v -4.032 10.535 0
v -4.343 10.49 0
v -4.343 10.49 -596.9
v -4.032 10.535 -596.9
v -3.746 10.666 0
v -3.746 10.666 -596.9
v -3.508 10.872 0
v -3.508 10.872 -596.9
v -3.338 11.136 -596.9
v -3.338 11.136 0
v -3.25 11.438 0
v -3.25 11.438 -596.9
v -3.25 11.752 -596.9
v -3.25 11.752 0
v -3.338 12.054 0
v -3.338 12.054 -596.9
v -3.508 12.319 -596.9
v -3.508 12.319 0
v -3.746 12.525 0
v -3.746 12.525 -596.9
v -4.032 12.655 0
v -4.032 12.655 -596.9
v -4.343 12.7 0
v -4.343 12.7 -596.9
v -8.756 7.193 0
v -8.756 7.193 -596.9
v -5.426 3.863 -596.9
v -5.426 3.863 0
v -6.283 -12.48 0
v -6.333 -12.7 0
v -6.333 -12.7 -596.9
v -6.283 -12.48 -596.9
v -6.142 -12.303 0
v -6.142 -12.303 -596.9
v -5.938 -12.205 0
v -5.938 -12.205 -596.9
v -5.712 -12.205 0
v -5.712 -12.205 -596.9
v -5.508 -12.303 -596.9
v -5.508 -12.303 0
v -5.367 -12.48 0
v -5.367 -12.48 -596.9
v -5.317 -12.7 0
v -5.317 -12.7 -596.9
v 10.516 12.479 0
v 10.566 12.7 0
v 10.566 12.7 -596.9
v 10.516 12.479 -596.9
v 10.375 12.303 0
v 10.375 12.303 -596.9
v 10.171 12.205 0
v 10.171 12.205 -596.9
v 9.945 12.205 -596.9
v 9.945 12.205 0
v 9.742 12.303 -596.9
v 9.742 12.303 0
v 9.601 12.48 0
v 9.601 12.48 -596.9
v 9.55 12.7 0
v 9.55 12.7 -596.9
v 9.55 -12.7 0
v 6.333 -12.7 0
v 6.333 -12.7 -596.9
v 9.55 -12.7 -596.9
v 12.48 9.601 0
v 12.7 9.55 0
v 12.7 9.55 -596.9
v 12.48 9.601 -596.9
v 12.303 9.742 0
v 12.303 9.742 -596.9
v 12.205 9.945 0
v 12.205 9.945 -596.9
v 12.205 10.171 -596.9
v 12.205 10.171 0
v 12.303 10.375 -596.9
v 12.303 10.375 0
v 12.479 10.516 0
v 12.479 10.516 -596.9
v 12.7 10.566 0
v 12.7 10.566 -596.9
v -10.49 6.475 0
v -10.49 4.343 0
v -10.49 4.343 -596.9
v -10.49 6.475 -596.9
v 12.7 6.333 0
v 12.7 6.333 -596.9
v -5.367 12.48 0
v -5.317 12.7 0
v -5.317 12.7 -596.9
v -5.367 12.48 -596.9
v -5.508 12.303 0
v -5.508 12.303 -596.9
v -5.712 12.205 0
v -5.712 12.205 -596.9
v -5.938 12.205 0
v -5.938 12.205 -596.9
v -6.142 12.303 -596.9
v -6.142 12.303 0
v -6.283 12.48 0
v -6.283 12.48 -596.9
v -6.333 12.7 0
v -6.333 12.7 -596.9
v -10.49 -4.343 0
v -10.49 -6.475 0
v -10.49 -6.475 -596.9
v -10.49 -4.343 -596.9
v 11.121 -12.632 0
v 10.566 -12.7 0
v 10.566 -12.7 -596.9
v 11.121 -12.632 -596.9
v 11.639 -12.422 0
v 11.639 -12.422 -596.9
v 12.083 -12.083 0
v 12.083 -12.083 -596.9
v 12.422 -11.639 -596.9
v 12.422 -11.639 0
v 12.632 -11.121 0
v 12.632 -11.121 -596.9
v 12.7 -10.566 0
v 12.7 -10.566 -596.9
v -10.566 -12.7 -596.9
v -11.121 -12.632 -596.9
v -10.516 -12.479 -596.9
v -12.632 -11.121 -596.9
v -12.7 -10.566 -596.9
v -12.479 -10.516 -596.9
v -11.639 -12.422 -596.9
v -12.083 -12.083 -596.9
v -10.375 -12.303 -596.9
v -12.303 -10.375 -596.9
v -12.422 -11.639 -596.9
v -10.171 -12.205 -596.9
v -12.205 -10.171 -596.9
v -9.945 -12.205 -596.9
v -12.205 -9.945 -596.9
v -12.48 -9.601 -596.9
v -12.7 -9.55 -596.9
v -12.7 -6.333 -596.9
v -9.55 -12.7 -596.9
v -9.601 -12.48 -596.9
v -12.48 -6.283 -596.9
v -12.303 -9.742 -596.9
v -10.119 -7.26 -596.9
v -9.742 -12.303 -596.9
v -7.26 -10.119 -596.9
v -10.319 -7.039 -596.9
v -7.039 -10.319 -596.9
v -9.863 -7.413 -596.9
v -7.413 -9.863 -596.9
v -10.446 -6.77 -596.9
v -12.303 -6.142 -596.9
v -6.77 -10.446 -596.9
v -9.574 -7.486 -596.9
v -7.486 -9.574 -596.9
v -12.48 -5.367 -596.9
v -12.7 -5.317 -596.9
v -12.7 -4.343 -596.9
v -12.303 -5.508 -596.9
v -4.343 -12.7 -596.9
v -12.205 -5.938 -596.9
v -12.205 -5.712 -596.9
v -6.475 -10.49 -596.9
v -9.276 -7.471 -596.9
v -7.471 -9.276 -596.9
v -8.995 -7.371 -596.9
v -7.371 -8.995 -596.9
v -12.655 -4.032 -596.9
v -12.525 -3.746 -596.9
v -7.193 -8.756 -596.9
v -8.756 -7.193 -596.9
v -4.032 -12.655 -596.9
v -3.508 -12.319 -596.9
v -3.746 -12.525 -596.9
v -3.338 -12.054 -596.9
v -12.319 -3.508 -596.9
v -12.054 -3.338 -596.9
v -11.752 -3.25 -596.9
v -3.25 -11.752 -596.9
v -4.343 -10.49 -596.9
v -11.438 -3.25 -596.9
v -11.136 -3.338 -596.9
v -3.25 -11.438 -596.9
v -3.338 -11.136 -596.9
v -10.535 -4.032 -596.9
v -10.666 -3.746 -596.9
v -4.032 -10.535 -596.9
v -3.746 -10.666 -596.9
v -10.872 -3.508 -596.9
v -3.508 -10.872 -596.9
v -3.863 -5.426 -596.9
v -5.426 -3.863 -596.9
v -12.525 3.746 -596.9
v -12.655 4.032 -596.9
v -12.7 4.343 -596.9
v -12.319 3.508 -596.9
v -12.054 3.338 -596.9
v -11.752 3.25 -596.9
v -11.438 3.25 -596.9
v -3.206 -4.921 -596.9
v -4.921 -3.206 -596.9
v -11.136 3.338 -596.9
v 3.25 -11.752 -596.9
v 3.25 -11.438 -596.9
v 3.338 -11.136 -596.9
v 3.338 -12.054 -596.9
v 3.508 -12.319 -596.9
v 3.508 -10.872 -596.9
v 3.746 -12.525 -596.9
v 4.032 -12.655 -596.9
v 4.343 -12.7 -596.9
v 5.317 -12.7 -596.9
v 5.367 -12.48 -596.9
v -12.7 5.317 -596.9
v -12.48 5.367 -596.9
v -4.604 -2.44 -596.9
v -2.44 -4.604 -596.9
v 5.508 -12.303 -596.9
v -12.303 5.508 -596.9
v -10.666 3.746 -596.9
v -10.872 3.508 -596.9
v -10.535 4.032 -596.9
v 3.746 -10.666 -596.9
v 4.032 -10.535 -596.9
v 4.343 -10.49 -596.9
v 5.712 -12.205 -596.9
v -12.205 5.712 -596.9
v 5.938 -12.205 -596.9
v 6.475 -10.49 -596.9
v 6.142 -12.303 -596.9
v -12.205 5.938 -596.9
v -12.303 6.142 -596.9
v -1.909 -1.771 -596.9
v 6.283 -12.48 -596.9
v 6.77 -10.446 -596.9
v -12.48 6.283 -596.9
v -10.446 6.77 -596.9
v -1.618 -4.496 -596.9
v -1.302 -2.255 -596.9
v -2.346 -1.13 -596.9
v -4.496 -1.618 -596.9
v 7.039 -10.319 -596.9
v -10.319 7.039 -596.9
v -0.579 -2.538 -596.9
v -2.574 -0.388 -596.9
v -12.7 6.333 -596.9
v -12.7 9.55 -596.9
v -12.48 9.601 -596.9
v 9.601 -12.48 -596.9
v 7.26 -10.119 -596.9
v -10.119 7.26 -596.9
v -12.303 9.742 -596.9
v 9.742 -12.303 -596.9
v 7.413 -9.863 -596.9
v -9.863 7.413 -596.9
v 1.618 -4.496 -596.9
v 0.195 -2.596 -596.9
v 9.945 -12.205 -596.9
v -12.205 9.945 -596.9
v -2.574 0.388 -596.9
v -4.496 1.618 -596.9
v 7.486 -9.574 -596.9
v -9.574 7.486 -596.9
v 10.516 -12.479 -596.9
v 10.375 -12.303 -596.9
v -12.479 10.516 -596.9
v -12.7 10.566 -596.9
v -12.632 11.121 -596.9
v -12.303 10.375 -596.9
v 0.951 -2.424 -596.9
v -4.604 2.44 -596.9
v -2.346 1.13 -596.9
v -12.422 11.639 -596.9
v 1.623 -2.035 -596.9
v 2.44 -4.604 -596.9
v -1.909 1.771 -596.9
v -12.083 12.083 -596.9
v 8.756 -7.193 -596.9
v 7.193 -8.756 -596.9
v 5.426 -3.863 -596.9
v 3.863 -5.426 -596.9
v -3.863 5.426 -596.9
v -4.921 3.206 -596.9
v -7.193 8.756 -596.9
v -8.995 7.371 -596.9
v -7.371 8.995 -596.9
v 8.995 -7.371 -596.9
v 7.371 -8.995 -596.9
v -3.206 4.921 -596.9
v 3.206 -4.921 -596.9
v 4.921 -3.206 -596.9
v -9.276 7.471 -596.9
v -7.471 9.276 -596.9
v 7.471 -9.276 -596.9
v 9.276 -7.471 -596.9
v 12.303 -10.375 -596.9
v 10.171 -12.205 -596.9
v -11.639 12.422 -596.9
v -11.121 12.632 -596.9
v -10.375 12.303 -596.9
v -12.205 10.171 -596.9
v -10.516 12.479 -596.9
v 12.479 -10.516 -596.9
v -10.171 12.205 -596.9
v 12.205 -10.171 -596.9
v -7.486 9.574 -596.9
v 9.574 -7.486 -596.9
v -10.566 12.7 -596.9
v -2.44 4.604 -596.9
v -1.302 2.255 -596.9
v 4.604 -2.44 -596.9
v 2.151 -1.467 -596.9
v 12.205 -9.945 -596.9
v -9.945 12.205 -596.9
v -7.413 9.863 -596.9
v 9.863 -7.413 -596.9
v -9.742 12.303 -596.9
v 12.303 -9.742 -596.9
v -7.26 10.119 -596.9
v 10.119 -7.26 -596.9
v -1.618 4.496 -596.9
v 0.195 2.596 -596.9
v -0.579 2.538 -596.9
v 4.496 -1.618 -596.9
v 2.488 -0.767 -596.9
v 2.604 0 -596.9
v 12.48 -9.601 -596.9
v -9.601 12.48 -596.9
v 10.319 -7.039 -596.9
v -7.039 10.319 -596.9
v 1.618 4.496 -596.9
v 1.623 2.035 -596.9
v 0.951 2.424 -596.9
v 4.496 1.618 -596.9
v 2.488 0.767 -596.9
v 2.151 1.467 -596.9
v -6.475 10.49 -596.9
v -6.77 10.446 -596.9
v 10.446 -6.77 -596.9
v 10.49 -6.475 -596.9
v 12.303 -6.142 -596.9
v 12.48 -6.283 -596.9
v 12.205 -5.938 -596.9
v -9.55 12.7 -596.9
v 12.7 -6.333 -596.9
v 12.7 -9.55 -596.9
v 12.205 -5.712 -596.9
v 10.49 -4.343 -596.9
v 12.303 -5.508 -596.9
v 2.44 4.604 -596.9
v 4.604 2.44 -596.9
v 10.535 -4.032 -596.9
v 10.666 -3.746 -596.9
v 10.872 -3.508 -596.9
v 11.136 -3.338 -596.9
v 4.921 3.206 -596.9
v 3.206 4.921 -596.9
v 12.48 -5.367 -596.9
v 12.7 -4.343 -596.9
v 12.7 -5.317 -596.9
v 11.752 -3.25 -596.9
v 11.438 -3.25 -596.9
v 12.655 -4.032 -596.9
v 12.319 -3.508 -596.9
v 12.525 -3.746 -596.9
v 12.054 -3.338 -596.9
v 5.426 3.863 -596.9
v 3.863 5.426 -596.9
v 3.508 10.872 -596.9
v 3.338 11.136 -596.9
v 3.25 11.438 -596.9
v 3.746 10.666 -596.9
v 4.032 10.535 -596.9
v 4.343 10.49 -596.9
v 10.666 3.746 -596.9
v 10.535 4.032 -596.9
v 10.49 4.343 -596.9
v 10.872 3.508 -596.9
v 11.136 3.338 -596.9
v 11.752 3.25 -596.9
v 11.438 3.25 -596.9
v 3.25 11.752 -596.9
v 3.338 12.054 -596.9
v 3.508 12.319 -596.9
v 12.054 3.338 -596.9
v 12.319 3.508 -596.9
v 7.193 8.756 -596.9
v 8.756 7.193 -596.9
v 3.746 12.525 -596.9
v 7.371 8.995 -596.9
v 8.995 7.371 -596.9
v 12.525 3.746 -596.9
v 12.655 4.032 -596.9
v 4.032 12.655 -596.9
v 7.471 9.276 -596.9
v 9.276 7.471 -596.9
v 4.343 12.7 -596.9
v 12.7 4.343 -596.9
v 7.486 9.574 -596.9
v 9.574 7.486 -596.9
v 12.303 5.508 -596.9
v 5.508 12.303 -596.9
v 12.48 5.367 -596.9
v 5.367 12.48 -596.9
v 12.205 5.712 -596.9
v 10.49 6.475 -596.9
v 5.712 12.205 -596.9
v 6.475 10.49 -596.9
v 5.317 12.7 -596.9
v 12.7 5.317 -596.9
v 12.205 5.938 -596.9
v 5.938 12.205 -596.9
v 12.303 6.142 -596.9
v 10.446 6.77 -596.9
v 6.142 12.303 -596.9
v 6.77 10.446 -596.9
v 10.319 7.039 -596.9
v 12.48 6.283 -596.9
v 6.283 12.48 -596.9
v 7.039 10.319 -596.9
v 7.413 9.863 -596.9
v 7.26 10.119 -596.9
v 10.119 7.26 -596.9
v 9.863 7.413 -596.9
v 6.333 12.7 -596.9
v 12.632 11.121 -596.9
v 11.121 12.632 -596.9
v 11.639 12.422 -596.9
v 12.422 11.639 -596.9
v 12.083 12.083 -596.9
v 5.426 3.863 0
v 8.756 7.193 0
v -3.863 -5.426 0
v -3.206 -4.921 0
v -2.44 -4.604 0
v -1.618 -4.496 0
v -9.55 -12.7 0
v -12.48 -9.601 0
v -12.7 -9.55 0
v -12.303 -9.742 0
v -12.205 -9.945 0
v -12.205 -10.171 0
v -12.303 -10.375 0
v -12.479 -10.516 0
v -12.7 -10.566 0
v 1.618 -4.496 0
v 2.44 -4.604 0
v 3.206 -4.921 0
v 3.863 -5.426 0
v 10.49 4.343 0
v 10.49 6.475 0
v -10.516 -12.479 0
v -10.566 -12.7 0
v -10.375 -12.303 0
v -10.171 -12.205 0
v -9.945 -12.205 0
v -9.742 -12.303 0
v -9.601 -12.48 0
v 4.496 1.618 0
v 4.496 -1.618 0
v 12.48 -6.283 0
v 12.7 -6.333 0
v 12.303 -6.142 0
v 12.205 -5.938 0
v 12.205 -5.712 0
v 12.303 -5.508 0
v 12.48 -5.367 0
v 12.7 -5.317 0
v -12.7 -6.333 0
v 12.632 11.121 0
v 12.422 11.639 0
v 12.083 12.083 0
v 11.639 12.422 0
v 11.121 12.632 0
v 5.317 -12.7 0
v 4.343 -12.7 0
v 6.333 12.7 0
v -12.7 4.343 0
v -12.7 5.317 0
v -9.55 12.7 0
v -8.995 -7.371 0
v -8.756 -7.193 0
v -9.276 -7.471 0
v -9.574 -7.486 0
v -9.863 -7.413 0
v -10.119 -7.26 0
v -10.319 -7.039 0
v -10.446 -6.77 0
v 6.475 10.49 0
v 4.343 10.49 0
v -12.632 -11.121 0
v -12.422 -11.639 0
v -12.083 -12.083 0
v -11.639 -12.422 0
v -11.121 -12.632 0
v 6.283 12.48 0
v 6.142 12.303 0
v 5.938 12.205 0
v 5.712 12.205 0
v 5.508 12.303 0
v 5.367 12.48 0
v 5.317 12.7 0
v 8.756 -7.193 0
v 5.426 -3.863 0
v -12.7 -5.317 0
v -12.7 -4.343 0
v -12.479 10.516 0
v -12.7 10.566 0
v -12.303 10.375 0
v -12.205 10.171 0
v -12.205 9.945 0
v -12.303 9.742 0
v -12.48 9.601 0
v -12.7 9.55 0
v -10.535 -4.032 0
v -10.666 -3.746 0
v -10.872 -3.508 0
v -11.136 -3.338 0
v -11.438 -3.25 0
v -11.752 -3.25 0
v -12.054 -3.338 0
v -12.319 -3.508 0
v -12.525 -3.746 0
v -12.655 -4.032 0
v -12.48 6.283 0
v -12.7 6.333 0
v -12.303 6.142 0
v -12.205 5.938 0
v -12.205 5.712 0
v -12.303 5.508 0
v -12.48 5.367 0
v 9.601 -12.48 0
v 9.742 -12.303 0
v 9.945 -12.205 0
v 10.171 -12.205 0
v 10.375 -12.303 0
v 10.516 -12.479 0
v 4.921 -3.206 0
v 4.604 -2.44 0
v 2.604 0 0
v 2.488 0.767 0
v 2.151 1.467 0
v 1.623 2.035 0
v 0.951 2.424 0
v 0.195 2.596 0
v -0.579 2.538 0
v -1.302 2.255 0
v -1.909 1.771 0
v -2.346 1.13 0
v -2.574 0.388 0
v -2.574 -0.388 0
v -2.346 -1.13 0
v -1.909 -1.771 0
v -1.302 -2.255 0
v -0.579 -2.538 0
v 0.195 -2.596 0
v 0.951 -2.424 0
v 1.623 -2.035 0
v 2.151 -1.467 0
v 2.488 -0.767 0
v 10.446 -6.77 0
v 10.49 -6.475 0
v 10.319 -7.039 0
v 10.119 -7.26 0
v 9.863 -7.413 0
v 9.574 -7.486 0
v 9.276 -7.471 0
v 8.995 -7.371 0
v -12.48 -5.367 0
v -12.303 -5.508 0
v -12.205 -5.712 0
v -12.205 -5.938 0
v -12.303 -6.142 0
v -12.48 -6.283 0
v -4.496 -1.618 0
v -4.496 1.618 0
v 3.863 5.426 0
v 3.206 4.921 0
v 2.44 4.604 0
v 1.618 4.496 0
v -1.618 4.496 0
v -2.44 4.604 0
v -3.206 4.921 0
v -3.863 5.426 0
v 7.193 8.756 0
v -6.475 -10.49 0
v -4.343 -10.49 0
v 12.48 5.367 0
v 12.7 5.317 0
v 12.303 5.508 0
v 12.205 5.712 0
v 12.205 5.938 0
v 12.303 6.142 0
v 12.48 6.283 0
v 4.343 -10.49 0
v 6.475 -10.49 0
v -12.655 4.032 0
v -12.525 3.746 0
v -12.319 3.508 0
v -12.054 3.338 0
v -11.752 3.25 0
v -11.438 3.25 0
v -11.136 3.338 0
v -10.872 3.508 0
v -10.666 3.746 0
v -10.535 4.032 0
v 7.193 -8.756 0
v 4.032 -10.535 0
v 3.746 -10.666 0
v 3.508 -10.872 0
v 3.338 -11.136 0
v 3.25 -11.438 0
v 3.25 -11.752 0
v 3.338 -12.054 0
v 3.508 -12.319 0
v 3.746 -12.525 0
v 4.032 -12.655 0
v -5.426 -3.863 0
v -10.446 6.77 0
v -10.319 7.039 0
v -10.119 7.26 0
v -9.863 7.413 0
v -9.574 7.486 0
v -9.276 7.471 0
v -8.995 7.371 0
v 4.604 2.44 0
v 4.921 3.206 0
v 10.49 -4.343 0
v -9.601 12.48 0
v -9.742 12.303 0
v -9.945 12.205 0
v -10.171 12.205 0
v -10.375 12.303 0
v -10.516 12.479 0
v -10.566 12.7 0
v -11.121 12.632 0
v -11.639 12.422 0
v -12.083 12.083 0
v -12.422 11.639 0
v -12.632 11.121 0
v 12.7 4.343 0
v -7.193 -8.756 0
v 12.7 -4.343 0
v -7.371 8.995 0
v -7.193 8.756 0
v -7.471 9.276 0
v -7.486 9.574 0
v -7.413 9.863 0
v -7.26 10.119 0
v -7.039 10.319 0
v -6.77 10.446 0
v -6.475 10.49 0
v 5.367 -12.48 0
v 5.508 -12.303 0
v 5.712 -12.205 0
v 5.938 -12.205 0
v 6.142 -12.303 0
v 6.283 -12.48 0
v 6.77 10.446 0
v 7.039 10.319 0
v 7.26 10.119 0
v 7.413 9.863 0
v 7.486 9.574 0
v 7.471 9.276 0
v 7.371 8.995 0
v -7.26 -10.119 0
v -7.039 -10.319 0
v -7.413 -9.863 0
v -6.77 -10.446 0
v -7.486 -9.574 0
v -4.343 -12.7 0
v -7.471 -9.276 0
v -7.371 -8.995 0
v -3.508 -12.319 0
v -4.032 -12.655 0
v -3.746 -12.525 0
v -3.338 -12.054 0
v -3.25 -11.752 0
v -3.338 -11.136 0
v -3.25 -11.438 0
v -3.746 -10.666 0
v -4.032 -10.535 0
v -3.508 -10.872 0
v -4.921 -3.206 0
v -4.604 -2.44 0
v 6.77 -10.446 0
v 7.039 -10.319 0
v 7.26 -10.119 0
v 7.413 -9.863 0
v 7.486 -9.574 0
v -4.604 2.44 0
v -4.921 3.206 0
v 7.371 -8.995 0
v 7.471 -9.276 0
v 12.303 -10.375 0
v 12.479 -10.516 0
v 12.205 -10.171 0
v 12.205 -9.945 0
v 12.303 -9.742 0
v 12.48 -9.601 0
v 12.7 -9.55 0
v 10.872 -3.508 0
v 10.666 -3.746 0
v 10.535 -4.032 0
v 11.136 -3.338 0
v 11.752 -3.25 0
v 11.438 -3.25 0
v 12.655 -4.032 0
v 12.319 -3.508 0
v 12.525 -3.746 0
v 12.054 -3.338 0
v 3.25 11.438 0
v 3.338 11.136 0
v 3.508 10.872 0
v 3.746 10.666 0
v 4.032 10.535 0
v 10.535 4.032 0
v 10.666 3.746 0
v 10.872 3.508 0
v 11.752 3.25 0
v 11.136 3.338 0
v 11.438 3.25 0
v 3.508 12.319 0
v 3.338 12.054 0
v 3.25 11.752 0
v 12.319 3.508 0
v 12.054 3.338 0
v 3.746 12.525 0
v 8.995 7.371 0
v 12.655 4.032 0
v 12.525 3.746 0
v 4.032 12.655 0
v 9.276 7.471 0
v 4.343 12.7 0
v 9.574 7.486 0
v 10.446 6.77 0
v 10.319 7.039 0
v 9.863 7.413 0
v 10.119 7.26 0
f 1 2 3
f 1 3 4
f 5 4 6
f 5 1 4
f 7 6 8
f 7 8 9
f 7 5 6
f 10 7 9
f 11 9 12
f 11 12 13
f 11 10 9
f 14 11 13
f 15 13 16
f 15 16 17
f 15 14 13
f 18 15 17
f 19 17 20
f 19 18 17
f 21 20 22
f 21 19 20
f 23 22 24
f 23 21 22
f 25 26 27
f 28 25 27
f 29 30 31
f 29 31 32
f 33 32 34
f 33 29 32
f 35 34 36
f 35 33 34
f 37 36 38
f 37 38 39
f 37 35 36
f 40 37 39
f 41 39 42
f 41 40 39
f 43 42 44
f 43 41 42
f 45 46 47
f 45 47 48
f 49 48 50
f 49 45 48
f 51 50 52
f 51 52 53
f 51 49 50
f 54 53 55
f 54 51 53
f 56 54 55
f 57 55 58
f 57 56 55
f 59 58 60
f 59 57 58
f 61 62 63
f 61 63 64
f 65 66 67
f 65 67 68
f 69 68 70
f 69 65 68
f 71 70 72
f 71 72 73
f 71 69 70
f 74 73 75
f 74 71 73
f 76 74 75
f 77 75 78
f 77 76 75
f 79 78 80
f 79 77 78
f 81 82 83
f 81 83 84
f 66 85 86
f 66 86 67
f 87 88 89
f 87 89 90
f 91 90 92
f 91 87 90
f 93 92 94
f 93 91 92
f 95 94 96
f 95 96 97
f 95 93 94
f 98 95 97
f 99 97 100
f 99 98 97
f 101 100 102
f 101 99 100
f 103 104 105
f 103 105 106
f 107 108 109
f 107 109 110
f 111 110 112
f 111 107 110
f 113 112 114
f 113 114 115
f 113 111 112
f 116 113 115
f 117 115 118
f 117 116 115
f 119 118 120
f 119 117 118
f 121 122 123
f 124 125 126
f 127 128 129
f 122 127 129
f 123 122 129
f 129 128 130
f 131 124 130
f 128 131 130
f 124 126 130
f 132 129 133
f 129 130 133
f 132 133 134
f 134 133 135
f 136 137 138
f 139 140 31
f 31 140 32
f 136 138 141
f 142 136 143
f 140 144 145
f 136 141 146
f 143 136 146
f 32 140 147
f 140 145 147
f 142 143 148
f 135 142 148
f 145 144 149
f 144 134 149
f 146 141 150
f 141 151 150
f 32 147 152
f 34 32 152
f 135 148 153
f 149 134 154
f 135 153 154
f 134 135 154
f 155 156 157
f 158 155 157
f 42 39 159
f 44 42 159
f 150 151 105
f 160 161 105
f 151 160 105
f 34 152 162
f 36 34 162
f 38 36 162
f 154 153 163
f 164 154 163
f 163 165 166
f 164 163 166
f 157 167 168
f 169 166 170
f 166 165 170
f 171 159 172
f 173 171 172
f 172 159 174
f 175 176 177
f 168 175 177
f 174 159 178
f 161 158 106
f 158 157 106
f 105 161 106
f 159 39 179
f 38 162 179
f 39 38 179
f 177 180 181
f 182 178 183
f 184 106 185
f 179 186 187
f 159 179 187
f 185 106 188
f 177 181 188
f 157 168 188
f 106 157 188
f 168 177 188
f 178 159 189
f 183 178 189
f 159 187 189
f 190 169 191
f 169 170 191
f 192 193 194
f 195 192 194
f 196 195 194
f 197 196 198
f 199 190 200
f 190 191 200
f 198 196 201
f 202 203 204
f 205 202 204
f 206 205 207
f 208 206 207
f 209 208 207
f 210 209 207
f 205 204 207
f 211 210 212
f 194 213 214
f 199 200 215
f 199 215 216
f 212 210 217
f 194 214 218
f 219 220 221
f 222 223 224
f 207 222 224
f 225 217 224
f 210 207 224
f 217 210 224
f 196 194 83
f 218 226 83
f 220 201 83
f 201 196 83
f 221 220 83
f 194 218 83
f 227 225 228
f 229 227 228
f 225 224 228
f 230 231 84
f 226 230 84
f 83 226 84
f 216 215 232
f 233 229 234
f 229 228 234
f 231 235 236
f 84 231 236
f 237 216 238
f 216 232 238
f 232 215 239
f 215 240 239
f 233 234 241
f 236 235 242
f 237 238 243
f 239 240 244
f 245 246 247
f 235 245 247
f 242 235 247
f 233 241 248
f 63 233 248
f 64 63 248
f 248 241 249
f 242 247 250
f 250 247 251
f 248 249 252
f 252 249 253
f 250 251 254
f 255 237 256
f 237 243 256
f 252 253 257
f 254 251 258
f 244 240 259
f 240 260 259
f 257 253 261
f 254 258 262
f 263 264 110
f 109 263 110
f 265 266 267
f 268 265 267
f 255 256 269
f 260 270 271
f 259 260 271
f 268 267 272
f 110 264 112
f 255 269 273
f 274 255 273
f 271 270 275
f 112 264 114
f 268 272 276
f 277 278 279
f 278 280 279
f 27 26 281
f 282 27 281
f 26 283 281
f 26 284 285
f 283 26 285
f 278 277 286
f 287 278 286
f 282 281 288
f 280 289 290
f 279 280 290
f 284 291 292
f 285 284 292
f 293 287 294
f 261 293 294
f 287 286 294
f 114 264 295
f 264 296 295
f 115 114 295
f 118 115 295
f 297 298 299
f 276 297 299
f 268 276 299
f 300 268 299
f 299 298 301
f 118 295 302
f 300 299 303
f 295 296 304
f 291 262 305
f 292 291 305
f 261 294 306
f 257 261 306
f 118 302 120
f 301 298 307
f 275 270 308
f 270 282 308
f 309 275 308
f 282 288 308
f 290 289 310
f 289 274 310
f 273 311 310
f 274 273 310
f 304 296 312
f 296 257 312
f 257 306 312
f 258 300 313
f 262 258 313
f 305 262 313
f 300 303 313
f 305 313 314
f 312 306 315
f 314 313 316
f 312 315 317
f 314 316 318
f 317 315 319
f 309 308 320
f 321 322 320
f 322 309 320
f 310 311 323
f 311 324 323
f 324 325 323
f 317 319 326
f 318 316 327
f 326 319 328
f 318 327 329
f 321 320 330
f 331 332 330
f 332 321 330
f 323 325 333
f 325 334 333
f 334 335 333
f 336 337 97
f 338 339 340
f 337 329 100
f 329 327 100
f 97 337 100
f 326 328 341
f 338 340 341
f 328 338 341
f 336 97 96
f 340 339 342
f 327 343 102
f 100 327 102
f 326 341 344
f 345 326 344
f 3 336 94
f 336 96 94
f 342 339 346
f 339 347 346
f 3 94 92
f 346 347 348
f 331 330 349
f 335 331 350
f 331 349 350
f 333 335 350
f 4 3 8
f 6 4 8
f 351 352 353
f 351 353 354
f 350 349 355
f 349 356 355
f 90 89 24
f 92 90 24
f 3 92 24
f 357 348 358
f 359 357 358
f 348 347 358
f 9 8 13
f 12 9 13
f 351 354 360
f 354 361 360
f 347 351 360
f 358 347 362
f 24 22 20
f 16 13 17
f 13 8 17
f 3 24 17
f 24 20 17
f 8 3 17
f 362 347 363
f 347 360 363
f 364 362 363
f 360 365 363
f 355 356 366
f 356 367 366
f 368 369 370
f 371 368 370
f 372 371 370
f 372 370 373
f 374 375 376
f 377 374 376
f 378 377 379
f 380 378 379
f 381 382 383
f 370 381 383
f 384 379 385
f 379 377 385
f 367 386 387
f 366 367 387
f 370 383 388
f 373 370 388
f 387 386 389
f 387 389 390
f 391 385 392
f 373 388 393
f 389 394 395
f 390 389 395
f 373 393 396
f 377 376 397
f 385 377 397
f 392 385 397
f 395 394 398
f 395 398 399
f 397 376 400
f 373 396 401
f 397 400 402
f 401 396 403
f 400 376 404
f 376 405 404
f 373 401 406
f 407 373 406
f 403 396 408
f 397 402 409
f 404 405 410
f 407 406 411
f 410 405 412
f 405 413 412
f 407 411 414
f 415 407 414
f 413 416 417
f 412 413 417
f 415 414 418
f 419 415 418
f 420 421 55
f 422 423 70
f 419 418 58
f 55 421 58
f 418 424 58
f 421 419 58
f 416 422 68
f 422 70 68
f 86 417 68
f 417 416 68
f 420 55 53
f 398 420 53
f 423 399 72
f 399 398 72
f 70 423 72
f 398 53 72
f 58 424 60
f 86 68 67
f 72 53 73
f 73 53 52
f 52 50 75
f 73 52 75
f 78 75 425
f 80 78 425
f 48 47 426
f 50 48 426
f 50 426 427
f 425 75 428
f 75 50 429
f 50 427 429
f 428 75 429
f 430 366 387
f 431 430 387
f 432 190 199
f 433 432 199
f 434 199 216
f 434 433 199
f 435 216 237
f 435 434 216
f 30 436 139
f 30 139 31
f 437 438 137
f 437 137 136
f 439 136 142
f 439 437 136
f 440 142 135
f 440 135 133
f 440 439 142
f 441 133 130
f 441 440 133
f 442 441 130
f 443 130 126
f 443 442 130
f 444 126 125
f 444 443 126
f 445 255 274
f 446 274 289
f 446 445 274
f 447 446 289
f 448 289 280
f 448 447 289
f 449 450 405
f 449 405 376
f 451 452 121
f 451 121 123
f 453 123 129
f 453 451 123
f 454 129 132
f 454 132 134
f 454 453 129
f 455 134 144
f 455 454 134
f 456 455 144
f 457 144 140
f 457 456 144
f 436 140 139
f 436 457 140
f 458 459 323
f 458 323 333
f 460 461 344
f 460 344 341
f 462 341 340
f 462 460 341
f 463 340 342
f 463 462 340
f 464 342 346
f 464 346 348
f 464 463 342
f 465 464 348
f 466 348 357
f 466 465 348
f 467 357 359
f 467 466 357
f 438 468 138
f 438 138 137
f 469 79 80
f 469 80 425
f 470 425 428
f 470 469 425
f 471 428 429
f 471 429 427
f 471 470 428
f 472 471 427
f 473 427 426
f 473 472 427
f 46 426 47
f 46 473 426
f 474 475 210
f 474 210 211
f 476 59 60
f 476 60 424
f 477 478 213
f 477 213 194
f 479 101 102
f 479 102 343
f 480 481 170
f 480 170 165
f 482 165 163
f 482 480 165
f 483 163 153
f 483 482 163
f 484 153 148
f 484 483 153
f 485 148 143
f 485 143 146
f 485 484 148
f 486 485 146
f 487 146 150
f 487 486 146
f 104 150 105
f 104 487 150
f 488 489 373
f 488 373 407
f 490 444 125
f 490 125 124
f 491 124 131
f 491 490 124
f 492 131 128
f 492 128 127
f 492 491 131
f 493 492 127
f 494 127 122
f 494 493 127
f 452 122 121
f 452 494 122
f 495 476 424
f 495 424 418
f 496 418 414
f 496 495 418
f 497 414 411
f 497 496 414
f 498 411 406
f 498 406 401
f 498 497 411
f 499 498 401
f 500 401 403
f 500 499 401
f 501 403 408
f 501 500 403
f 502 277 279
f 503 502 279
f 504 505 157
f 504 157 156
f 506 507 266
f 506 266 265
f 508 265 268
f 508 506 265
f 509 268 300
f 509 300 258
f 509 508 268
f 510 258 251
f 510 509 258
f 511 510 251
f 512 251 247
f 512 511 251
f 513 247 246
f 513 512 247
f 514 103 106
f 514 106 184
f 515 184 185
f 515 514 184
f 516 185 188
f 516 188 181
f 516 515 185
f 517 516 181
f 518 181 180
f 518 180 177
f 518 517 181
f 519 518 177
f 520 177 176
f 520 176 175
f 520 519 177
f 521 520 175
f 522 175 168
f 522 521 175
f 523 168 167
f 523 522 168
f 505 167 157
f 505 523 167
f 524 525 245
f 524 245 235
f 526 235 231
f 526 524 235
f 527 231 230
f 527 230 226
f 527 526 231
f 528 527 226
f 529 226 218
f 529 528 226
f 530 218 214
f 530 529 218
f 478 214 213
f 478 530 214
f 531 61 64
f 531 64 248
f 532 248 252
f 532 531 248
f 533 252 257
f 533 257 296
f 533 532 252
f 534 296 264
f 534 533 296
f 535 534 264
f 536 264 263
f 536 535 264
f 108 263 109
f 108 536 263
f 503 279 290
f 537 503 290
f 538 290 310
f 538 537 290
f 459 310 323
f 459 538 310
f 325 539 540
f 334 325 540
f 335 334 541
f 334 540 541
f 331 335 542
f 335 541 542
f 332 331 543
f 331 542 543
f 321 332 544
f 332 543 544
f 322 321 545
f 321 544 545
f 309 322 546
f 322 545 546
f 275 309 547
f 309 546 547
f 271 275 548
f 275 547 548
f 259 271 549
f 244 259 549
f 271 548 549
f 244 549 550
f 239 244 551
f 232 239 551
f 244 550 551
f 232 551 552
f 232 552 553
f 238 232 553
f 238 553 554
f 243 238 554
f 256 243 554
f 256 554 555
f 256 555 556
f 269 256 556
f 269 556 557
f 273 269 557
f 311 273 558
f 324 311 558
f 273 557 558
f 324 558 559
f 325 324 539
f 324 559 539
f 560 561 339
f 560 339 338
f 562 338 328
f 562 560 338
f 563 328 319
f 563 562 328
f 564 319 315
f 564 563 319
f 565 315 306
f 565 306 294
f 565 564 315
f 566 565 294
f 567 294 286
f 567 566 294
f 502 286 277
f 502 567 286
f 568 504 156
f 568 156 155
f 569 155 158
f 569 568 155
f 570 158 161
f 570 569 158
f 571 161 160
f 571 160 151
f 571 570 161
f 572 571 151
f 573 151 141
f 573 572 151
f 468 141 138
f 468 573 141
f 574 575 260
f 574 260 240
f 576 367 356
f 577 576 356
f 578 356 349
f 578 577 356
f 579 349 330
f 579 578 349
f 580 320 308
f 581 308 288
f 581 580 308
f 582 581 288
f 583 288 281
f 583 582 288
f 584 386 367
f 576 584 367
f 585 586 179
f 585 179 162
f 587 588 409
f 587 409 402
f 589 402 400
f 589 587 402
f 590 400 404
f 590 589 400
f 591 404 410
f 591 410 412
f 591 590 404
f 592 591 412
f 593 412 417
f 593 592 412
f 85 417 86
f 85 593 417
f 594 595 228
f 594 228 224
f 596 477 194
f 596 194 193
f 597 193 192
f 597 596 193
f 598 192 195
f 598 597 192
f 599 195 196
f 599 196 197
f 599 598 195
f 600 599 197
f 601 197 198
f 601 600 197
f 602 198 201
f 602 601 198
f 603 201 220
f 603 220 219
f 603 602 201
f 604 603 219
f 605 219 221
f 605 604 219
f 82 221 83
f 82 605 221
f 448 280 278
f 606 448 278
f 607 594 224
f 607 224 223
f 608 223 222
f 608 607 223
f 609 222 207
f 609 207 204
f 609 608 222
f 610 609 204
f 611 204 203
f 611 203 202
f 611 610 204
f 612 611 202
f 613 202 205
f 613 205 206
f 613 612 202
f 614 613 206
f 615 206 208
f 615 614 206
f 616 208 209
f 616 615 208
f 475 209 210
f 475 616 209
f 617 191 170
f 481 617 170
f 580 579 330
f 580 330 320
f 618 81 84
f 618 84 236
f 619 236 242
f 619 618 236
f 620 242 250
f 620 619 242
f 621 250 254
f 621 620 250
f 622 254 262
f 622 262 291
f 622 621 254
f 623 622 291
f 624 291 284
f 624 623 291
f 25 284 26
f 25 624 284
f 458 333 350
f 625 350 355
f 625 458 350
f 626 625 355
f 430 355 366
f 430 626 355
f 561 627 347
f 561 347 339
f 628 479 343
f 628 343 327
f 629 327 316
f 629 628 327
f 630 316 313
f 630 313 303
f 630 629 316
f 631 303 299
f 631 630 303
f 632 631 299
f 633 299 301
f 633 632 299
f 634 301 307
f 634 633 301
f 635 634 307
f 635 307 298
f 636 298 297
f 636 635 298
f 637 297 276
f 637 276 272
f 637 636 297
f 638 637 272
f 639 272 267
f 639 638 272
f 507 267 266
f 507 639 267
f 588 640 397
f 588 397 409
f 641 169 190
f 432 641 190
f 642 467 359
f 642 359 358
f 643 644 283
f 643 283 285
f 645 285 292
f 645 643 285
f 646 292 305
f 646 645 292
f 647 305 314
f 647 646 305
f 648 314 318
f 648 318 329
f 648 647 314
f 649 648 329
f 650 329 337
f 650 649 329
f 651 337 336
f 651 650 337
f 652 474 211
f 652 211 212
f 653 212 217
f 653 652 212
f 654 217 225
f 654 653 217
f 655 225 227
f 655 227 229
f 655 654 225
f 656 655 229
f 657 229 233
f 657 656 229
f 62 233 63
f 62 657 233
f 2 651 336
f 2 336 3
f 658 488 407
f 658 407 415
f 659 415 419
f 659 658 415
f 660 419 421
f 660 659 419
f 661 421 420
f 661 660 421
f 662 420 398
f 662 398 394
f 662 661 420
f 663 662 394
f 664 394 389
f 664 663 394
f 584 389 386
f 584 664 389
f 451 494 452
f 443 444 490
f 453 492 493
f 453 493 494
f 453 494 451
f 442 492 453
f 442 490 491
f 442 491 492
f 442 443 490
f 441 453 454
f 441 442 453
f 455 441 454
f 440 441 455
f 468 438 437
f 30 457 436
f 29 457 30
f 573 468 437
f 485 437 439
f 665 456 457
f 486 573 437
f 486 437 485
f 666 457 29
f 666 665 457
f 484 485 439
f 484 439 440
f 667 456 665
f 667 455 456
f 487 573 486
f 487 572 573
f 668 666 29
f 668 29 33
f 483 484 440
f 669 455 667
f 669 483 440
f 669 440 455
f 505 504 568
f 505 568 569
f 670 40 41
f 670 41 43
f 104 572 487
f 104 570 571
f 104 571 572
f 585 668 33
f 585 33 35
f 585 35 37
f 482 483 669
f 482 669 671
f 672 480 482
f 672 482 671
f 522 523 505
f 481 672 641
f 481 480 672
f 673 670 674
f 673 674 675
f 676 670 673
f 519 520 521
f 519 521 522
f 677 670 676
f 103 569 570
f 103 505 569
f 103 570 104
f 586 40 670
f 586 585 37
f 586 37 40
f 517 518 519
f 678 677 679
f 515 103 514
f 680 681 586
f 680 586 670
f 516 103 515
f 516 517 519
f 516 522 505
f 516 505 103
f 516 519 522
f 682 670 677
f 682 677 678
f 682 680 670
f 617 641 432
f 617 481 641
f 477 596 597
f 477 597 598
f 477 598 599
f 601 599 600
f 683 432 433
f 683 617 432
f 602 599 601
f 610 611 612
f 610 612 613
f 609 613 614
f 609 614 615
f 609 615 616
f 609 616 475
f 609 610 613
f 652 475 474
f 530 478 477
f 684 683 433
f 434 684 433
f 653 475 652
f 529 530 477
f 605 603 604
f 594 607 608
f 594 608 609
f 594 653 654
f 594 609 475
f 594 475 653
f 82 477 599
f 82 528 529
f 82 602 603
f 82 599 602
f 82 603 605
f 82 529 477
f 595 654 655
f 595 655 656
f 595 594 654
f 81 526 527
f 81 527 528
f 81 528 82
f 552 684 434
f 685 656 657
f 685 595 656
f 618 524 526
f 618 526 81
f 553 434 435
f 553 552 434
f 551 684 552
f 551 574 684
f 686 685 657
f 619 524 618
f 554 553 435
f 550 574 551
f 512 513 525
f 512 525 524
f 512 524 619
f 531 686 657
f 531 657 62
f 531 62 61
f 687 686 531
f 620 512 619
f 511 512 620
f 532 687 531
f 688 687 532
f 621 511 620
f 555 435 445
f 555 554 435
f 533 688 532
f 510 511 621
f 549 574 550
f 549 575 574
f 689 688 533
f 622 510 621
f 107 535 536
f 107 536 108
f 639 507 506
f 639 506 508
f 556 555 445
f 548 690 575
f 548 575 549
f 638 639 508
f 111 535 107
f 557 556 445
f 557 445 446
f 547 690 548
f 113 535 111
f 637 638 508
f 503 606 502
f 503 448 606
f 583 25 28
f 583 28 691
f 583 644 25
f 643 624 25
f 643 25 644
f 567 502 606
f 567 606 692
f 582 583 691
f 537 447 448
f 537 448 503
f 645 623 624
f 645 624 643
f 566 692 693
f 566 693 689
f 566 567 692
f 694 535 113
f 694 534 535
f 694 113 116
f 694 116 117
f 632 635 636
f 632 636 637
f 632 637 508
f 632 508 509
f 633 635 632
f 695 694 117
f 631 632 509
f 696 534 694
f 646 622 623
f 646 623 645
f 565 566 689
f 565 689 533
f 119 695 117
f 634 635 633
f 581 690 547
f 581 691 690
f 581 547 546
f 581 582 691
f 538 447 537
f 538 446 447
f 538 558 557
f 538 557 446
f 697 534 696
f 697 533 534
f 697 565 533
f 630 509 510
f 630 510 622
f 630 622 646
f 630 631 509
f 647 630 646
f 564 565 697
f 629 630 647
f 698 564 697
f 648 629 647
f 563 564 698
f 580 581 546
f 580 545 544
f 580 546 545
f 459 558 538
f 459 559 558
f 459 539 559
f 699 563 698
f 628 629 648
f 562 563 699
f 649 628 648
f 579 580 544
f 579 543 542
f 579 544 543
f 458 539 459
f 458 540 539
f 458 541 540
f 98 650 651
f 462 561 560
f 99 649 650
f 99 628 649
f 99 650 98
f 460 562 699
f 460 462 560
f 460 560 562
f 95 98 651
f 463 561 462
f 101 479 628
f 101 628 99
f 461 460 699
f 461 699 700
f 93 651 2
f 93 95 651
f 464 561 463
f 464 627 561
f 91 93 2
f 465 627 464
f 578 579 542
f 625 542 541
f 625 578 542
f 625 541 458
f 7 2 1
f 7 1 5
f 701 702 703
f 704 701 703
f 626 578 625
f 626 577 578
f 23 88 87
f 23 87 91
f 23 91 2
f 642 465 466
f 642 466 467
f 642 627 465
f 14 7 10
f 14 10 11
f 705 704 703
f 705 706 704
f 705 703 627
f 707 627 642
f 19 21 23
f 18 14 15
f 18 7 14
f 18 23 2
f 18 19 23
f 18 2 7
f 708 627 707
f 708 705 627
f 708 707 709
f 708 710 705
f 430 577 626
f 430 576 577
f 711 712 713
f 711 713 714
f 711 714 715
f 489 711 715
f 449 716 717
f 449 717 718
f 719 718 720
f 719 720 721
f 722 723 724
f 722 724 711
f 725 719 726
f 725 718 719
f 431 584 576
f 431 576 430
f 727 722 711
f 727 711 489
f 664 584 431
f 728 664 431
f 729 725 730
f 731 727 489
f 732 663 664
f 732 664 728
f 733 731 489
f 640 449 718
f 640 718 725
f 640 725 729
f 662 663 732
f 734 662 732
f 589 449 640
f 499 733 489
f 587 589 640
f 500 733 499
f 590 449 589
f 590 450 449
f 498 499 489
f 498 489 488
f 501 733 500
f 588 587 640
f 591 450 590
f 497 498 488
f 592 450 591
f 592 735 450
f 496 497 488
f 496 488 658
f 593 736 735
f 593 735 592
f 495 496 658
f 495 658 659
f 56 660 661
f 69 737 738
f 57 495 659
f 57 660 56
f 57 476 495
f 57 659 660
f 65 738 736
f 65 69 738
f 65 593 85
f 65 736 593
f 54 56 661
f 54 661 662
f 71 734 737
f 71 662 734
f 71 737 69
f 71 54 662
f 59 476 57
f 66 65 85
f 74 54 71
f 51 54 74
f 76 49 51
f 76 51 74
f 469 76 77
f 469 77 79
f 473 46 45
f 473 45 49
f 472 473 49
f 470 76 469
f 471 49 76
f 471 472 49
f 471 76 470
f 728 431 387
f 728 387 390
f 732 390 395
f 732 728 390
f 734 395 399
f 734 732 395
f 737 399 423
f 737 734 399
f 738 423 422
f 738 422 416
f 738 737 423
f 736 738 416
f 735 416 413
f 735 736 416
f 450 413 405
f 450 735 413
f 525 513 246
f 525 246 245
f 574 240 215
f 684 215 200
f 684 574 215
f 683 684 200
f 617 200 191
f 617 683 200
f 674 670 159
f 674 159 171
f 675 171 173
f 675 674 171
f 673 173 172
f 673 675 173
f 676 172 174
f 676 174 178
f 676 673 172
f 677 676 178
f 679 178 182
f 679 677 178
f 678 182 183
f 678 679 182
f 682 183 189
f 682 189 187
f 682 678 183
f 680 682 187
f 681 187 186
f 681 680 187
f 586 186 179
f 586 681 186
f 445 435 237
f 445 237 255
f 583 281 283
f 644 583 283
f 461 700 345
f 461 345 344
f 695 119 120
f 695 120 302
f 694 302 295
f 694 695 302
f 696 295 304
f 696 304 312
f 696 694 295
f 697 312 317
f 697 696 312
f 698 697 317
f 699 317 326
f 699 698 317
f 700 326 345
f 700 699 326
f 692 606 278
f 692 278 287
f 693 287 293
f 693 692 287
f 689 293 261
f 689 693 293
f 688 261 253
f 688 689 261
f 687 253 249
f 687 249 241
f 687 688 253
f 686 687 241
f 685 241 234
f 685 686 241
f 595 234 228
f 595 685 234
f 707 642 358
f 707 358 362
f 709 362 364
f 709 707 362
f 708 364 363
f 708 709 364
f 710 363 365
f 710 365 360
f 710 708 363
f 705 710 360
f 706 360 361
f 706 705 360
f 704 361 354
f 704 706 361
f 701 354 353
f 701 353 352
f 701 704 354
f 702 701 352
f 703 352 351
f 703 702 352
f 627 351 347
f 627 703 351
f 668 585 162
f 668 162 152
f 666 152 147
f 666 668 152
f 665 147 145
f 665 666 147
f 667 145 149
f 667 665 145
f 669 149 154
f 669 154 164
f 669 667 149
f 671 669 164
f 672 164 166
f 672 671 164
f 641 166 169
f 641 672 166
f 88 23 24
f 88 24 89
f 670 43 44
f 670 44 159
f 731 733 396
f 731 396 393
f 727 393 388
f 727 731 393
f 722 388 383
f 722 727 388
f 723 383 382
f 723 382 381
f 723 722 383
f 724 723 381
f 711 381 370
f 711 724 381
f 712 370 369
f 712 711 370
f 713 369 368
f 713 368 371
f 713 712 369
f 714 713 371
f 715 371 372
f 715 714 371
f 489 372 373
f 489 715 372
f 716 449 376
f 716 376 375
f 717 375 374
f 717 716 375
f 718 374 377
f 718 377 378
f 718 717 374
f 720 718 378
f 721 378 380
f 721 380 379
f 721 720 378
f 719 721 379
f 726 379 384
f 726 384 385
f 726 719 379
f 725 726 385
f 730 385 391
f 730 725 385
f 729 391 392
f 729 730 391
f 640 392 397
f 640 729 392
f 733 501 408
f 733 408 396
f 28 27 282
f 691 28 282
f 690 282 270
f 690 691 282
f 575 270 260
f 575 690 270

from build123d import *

# Parameters (mm, degrees)
SKETCH1_R           = 2.6035
BOSS_EXTRUDE1_DEPTH = 596.9


with BuildPart() as part:
    # Sketch1 → Boss-Extrude1 (new body)
    with BuildSketch(Plane.XY):
        with BuildLine():
            Line((-12.7, 9.5504), (-12.7, 6.3330836))
            ThreePointArc((-12.7, 6.3330836), (-12.191999975, 5.8250836), (-12.7, 5.3170836))
            Line((-12.7, 5.3170836), (-12.7, 4.3434))
            ThreePointArc((-12.7, 4.3434), (-11.5951, 3.238499971), (-10.4902, 4.3434))
            Line((-10.4902, 4.3434), (-10.4902, 6.474794456))
            ThreePointArc((-10.4902, 6.474794456), (-9.863006367, 7.413456061), (-8.75577951, 7.193214945))
            Line((-8.75577951, 7.193214945), (-5.42573597, 3.863171405))
            ThreePointArc((-5.42573597, 3.863171405), (-4.737482484, 2.833127272), (-4.4958, 1.618107374))
            Line((-4.4958, 1.618107374), (-4.4958, -1.618107374))
            ThreePointArc((-4.4958, -1.618107374), (-4.737482484, -2.833127272), (-5.42573597, -3.863171405))
            Line((-5.42573597, -3.863171405), (-8.75577951, -7.193214945))
            ThreePointArc((-8.75577951, -7.193214945), (-9.863006367, -7.413456061), (-10.4902, -6.474794456))
            Line((-10.4902, -6.474794456), (-10.4902, -4.3434))
            ThreePointArc((-10.4902, -4.3434), (-11.5951, -3.2385), (-12.7, -4.3434))
            Line((-12.7, -4.3434), (-12.7, -5.3170836))
            ThreePointArc((-12.7, -5.3170836), (-12.191999983, -5.8250836), (-12.7, -6.3330836))
            Line((-12.7, -6.3330836), (-12.7, -9.5504))
            ThreePointArc((-12.7, -9.5504), (-12.192000006, -10.058323491), (-12.699846982, -10.566399977))
            ThreePointArc((-12.699846982, -10.566399977), (-12.082522516, -12.082522516), (-10.566399977, -12.699846982))
            ThreePointArc((-10.566399977, -12.699846982), (-10.058323491, -12.192000006), (-9.5504, -12.7))
            Line((-9.5504, -12.7), (-6.3330836, -12.7))
            ThreePointArc((-6.3330836, -12.7), (-5.8250836, -12.191999983), (-5.3170836, -12.7))
            Line((-5.3170836, -12.7), (-4.3434, -12.7))
            ThreePointArc((-4.3434, -12.7), (-3.238499971, -11.5951), (-4.3434, -10.4902))
            Line((-4.3434, -10.4902), (-6.474794456, -10.4902))
            ThreePointArc((-6.474794456, -10.4902), (-7.413456061, -9.863006367), (-7.193214945, -8.75577951))
            Line((-7.193214945, -8.75577951), (-3.863171405, -5.42573597))
            ThreePointArc((-3.863171405, -5.42573597), (-2.833127272, -4.737482484), (-1.618107374, -4.4958))
            Line((-1.618107374, -4.4958), (1.618107374, -4.4958))
            ThreePointArc((1.618107374, -4.4958), (2.833127272, -4.737482484), (3.863171405, -5.42573597))
            Line((3.863171405, -5.42573597), (7.193214945, -8.75577951))
            ThreePointArc((7.193214945, -8.75577951), (7.413456061, -9.863006367), (6.474794456, -10.4902))
            Line((6.474794456, -10.4902), (4.3434, -10.4902))
            ThreePointArc((4.3434, -10.4902), (3.2385, -11.5951), (4.3434, -12.7))
            Line((4.3434, -12.7), (5.3170836, -12.7))
            ThreePointArc((5.3170836, -12.7), (5.8250836, -12.191999983), (6.3330836, -12.7))
            Line((6.3330836, -12.7), (9.5504, -12.7))
            ThreePointArc((9.5504, -12.7), (10.058323491, -12.192000006), (10.566399977, -12.699846982))
            ThreePointArc((10.566399977, -12.699846982), (12.082522516, -12.082522516), (12.699846982, -10.566399977))
            ThreePointArc((12.699846982, -10.566399977), (12.192000006, -10.058323491), (12.7, -9.5504))
            Line((12.7, -9.5504), (12.7, -6.3330836))
            ThreePointArc((12.7, -6.3330836), (12.191999983, -5.8250836), (12.7, -5.3170836))
            Line((12.7, -5.3170836), (12.7, -4.3434))
            ThreePointArc((12.7, -4.3434), (11.5951, -3.238499971), (10.4902, -4.3434))
            Line((10.4902, -4.3434), (10.4902, -6.474794456))
            ThreePointArc((10.4902, -6.474794456), (9.863006367, -7.413456061), (8.75577951, -7.193214945))
            Line((8.75577951, -7.193214945), (5.42573597, -3.863171405))
            ThreePointArc((5.42573597, -3.863171405), (4.737482484, -2.833127272), (4.4958, -1.618107374))
            Line((4.4958, -1.618107374), (4.4958, 1.618107374))
            ThreePointArc((4.4958, 1.618107374), (4.737482484, 2.833127272), (5.42573597, 3.863171405))
            Line((5.42573597, 3.863171405), (8.75577951, 7.193214945))
            ThreePointArc((8.75577951, 7.193214945), (9.863006367, 7.413456061), (10.4902, 6.474794456))
            Line((10.4902, 6.474794456), (10.4902, 4.3434))
            ThreePointArc((10.4902, 4.3434), (11.5951, 3.2385), (12.7, 4.3434))
            Line((12.7, 4.3434), (12.7, 5.3170836))
            ThreePointArc((12.7, 5.3170836), (12.191999983, 5.8250836), (12.7, 6.3330836))
            Line((12.7, 6.3330836), (12.7, 9.5504))
            ThreePointArc((12.7, 9.5504), (12.192000006, 10.058323491), (12.699846982, 10.566399977))
            ThreePointArc((12.699846982, 10.566399977), (12.082522516, 12.082522516), (10.566399977, 12.699846982))
            ThreePointArc((10.566399977, 12.699846982), (10.058323491, 12.192000006), (9.5504, 12.7))
            Line((9.5504, 12.7), (6.3330836, 12.7))
            ThreePointArc((6.3330836, 12.7), (5.8250836, 12.192), (5.3170836, 12.7))
            Line((5.3170836, 12.7), (4.3434, 12.7))
            ThreePointArc((4.3434, 12.7), (3.238499971, 11.5951), (4.3434, 10.4902))
            Line((4.3434, 10.4902), (6.474794456, 10.4902))
            ThreePointArc((6.474794456, 10.4902), (7.413456061, 9.863006367), (7.193214945, 8.75577951))
            Line((7.193214945, 8.75577951), (3.863171405, 5.42573597))
            ThreePointArc((3.863171405, 5.42573597), (2.833127272, 4.737482484), (1.618107374, 4.4958))
            Line((1.618107374, 4.4958), (-1.618107374, 4.4958))
            ThreePointArc((-1.618107374, 4.4958), (-2.833127272, 4.737482484), (-3.863171405, 5.42573597))
            Line((-3.863171405, 5.42573597), (-7.193214945, 8.75577951))
            ThreePointArc((-7.193214945, 8.75577951), (-7.413456061, 9.863006367), (-6.474794456, 10.4902))
            Line((-6.474794456, 10.4902), (-4.3434, 10.4902))
            ThreePointArc((-4.3434, 10.4902), (-3.2385, 11.5951), (-4.3434, 12.7))
            Line((-4.3434, 12.7), (-5.3170836, 12.7))
            ThreePointArc((-5.3170836, 12.7), (-5.8250836, 12.191999983), (-6.3330836, 12.7))
            Line((-6.3330836, 12.7), (-9.5504, 12.7))
            ThreePointArc((-9.5504, 12.7), (-10.058323491, 12.192000006), (-10.566399977, 12.699846982))
            ThreePointArc((-10.566399977, 12.699846982), (-12.082522516, 12.082522516), (-12.699846982, 10.566399977))
            ThreePointArc((-12.699846982, 10.566399977), (-12.192000006, 10.058323491), (-12.7, 9.5504))
        make_face()
        Circle(SKETCH1_R, mode=Mode.SUBTRACT)
    extrude(amount=-BOSS_EXTRUDE1_DEPTH)


solid = part.part
